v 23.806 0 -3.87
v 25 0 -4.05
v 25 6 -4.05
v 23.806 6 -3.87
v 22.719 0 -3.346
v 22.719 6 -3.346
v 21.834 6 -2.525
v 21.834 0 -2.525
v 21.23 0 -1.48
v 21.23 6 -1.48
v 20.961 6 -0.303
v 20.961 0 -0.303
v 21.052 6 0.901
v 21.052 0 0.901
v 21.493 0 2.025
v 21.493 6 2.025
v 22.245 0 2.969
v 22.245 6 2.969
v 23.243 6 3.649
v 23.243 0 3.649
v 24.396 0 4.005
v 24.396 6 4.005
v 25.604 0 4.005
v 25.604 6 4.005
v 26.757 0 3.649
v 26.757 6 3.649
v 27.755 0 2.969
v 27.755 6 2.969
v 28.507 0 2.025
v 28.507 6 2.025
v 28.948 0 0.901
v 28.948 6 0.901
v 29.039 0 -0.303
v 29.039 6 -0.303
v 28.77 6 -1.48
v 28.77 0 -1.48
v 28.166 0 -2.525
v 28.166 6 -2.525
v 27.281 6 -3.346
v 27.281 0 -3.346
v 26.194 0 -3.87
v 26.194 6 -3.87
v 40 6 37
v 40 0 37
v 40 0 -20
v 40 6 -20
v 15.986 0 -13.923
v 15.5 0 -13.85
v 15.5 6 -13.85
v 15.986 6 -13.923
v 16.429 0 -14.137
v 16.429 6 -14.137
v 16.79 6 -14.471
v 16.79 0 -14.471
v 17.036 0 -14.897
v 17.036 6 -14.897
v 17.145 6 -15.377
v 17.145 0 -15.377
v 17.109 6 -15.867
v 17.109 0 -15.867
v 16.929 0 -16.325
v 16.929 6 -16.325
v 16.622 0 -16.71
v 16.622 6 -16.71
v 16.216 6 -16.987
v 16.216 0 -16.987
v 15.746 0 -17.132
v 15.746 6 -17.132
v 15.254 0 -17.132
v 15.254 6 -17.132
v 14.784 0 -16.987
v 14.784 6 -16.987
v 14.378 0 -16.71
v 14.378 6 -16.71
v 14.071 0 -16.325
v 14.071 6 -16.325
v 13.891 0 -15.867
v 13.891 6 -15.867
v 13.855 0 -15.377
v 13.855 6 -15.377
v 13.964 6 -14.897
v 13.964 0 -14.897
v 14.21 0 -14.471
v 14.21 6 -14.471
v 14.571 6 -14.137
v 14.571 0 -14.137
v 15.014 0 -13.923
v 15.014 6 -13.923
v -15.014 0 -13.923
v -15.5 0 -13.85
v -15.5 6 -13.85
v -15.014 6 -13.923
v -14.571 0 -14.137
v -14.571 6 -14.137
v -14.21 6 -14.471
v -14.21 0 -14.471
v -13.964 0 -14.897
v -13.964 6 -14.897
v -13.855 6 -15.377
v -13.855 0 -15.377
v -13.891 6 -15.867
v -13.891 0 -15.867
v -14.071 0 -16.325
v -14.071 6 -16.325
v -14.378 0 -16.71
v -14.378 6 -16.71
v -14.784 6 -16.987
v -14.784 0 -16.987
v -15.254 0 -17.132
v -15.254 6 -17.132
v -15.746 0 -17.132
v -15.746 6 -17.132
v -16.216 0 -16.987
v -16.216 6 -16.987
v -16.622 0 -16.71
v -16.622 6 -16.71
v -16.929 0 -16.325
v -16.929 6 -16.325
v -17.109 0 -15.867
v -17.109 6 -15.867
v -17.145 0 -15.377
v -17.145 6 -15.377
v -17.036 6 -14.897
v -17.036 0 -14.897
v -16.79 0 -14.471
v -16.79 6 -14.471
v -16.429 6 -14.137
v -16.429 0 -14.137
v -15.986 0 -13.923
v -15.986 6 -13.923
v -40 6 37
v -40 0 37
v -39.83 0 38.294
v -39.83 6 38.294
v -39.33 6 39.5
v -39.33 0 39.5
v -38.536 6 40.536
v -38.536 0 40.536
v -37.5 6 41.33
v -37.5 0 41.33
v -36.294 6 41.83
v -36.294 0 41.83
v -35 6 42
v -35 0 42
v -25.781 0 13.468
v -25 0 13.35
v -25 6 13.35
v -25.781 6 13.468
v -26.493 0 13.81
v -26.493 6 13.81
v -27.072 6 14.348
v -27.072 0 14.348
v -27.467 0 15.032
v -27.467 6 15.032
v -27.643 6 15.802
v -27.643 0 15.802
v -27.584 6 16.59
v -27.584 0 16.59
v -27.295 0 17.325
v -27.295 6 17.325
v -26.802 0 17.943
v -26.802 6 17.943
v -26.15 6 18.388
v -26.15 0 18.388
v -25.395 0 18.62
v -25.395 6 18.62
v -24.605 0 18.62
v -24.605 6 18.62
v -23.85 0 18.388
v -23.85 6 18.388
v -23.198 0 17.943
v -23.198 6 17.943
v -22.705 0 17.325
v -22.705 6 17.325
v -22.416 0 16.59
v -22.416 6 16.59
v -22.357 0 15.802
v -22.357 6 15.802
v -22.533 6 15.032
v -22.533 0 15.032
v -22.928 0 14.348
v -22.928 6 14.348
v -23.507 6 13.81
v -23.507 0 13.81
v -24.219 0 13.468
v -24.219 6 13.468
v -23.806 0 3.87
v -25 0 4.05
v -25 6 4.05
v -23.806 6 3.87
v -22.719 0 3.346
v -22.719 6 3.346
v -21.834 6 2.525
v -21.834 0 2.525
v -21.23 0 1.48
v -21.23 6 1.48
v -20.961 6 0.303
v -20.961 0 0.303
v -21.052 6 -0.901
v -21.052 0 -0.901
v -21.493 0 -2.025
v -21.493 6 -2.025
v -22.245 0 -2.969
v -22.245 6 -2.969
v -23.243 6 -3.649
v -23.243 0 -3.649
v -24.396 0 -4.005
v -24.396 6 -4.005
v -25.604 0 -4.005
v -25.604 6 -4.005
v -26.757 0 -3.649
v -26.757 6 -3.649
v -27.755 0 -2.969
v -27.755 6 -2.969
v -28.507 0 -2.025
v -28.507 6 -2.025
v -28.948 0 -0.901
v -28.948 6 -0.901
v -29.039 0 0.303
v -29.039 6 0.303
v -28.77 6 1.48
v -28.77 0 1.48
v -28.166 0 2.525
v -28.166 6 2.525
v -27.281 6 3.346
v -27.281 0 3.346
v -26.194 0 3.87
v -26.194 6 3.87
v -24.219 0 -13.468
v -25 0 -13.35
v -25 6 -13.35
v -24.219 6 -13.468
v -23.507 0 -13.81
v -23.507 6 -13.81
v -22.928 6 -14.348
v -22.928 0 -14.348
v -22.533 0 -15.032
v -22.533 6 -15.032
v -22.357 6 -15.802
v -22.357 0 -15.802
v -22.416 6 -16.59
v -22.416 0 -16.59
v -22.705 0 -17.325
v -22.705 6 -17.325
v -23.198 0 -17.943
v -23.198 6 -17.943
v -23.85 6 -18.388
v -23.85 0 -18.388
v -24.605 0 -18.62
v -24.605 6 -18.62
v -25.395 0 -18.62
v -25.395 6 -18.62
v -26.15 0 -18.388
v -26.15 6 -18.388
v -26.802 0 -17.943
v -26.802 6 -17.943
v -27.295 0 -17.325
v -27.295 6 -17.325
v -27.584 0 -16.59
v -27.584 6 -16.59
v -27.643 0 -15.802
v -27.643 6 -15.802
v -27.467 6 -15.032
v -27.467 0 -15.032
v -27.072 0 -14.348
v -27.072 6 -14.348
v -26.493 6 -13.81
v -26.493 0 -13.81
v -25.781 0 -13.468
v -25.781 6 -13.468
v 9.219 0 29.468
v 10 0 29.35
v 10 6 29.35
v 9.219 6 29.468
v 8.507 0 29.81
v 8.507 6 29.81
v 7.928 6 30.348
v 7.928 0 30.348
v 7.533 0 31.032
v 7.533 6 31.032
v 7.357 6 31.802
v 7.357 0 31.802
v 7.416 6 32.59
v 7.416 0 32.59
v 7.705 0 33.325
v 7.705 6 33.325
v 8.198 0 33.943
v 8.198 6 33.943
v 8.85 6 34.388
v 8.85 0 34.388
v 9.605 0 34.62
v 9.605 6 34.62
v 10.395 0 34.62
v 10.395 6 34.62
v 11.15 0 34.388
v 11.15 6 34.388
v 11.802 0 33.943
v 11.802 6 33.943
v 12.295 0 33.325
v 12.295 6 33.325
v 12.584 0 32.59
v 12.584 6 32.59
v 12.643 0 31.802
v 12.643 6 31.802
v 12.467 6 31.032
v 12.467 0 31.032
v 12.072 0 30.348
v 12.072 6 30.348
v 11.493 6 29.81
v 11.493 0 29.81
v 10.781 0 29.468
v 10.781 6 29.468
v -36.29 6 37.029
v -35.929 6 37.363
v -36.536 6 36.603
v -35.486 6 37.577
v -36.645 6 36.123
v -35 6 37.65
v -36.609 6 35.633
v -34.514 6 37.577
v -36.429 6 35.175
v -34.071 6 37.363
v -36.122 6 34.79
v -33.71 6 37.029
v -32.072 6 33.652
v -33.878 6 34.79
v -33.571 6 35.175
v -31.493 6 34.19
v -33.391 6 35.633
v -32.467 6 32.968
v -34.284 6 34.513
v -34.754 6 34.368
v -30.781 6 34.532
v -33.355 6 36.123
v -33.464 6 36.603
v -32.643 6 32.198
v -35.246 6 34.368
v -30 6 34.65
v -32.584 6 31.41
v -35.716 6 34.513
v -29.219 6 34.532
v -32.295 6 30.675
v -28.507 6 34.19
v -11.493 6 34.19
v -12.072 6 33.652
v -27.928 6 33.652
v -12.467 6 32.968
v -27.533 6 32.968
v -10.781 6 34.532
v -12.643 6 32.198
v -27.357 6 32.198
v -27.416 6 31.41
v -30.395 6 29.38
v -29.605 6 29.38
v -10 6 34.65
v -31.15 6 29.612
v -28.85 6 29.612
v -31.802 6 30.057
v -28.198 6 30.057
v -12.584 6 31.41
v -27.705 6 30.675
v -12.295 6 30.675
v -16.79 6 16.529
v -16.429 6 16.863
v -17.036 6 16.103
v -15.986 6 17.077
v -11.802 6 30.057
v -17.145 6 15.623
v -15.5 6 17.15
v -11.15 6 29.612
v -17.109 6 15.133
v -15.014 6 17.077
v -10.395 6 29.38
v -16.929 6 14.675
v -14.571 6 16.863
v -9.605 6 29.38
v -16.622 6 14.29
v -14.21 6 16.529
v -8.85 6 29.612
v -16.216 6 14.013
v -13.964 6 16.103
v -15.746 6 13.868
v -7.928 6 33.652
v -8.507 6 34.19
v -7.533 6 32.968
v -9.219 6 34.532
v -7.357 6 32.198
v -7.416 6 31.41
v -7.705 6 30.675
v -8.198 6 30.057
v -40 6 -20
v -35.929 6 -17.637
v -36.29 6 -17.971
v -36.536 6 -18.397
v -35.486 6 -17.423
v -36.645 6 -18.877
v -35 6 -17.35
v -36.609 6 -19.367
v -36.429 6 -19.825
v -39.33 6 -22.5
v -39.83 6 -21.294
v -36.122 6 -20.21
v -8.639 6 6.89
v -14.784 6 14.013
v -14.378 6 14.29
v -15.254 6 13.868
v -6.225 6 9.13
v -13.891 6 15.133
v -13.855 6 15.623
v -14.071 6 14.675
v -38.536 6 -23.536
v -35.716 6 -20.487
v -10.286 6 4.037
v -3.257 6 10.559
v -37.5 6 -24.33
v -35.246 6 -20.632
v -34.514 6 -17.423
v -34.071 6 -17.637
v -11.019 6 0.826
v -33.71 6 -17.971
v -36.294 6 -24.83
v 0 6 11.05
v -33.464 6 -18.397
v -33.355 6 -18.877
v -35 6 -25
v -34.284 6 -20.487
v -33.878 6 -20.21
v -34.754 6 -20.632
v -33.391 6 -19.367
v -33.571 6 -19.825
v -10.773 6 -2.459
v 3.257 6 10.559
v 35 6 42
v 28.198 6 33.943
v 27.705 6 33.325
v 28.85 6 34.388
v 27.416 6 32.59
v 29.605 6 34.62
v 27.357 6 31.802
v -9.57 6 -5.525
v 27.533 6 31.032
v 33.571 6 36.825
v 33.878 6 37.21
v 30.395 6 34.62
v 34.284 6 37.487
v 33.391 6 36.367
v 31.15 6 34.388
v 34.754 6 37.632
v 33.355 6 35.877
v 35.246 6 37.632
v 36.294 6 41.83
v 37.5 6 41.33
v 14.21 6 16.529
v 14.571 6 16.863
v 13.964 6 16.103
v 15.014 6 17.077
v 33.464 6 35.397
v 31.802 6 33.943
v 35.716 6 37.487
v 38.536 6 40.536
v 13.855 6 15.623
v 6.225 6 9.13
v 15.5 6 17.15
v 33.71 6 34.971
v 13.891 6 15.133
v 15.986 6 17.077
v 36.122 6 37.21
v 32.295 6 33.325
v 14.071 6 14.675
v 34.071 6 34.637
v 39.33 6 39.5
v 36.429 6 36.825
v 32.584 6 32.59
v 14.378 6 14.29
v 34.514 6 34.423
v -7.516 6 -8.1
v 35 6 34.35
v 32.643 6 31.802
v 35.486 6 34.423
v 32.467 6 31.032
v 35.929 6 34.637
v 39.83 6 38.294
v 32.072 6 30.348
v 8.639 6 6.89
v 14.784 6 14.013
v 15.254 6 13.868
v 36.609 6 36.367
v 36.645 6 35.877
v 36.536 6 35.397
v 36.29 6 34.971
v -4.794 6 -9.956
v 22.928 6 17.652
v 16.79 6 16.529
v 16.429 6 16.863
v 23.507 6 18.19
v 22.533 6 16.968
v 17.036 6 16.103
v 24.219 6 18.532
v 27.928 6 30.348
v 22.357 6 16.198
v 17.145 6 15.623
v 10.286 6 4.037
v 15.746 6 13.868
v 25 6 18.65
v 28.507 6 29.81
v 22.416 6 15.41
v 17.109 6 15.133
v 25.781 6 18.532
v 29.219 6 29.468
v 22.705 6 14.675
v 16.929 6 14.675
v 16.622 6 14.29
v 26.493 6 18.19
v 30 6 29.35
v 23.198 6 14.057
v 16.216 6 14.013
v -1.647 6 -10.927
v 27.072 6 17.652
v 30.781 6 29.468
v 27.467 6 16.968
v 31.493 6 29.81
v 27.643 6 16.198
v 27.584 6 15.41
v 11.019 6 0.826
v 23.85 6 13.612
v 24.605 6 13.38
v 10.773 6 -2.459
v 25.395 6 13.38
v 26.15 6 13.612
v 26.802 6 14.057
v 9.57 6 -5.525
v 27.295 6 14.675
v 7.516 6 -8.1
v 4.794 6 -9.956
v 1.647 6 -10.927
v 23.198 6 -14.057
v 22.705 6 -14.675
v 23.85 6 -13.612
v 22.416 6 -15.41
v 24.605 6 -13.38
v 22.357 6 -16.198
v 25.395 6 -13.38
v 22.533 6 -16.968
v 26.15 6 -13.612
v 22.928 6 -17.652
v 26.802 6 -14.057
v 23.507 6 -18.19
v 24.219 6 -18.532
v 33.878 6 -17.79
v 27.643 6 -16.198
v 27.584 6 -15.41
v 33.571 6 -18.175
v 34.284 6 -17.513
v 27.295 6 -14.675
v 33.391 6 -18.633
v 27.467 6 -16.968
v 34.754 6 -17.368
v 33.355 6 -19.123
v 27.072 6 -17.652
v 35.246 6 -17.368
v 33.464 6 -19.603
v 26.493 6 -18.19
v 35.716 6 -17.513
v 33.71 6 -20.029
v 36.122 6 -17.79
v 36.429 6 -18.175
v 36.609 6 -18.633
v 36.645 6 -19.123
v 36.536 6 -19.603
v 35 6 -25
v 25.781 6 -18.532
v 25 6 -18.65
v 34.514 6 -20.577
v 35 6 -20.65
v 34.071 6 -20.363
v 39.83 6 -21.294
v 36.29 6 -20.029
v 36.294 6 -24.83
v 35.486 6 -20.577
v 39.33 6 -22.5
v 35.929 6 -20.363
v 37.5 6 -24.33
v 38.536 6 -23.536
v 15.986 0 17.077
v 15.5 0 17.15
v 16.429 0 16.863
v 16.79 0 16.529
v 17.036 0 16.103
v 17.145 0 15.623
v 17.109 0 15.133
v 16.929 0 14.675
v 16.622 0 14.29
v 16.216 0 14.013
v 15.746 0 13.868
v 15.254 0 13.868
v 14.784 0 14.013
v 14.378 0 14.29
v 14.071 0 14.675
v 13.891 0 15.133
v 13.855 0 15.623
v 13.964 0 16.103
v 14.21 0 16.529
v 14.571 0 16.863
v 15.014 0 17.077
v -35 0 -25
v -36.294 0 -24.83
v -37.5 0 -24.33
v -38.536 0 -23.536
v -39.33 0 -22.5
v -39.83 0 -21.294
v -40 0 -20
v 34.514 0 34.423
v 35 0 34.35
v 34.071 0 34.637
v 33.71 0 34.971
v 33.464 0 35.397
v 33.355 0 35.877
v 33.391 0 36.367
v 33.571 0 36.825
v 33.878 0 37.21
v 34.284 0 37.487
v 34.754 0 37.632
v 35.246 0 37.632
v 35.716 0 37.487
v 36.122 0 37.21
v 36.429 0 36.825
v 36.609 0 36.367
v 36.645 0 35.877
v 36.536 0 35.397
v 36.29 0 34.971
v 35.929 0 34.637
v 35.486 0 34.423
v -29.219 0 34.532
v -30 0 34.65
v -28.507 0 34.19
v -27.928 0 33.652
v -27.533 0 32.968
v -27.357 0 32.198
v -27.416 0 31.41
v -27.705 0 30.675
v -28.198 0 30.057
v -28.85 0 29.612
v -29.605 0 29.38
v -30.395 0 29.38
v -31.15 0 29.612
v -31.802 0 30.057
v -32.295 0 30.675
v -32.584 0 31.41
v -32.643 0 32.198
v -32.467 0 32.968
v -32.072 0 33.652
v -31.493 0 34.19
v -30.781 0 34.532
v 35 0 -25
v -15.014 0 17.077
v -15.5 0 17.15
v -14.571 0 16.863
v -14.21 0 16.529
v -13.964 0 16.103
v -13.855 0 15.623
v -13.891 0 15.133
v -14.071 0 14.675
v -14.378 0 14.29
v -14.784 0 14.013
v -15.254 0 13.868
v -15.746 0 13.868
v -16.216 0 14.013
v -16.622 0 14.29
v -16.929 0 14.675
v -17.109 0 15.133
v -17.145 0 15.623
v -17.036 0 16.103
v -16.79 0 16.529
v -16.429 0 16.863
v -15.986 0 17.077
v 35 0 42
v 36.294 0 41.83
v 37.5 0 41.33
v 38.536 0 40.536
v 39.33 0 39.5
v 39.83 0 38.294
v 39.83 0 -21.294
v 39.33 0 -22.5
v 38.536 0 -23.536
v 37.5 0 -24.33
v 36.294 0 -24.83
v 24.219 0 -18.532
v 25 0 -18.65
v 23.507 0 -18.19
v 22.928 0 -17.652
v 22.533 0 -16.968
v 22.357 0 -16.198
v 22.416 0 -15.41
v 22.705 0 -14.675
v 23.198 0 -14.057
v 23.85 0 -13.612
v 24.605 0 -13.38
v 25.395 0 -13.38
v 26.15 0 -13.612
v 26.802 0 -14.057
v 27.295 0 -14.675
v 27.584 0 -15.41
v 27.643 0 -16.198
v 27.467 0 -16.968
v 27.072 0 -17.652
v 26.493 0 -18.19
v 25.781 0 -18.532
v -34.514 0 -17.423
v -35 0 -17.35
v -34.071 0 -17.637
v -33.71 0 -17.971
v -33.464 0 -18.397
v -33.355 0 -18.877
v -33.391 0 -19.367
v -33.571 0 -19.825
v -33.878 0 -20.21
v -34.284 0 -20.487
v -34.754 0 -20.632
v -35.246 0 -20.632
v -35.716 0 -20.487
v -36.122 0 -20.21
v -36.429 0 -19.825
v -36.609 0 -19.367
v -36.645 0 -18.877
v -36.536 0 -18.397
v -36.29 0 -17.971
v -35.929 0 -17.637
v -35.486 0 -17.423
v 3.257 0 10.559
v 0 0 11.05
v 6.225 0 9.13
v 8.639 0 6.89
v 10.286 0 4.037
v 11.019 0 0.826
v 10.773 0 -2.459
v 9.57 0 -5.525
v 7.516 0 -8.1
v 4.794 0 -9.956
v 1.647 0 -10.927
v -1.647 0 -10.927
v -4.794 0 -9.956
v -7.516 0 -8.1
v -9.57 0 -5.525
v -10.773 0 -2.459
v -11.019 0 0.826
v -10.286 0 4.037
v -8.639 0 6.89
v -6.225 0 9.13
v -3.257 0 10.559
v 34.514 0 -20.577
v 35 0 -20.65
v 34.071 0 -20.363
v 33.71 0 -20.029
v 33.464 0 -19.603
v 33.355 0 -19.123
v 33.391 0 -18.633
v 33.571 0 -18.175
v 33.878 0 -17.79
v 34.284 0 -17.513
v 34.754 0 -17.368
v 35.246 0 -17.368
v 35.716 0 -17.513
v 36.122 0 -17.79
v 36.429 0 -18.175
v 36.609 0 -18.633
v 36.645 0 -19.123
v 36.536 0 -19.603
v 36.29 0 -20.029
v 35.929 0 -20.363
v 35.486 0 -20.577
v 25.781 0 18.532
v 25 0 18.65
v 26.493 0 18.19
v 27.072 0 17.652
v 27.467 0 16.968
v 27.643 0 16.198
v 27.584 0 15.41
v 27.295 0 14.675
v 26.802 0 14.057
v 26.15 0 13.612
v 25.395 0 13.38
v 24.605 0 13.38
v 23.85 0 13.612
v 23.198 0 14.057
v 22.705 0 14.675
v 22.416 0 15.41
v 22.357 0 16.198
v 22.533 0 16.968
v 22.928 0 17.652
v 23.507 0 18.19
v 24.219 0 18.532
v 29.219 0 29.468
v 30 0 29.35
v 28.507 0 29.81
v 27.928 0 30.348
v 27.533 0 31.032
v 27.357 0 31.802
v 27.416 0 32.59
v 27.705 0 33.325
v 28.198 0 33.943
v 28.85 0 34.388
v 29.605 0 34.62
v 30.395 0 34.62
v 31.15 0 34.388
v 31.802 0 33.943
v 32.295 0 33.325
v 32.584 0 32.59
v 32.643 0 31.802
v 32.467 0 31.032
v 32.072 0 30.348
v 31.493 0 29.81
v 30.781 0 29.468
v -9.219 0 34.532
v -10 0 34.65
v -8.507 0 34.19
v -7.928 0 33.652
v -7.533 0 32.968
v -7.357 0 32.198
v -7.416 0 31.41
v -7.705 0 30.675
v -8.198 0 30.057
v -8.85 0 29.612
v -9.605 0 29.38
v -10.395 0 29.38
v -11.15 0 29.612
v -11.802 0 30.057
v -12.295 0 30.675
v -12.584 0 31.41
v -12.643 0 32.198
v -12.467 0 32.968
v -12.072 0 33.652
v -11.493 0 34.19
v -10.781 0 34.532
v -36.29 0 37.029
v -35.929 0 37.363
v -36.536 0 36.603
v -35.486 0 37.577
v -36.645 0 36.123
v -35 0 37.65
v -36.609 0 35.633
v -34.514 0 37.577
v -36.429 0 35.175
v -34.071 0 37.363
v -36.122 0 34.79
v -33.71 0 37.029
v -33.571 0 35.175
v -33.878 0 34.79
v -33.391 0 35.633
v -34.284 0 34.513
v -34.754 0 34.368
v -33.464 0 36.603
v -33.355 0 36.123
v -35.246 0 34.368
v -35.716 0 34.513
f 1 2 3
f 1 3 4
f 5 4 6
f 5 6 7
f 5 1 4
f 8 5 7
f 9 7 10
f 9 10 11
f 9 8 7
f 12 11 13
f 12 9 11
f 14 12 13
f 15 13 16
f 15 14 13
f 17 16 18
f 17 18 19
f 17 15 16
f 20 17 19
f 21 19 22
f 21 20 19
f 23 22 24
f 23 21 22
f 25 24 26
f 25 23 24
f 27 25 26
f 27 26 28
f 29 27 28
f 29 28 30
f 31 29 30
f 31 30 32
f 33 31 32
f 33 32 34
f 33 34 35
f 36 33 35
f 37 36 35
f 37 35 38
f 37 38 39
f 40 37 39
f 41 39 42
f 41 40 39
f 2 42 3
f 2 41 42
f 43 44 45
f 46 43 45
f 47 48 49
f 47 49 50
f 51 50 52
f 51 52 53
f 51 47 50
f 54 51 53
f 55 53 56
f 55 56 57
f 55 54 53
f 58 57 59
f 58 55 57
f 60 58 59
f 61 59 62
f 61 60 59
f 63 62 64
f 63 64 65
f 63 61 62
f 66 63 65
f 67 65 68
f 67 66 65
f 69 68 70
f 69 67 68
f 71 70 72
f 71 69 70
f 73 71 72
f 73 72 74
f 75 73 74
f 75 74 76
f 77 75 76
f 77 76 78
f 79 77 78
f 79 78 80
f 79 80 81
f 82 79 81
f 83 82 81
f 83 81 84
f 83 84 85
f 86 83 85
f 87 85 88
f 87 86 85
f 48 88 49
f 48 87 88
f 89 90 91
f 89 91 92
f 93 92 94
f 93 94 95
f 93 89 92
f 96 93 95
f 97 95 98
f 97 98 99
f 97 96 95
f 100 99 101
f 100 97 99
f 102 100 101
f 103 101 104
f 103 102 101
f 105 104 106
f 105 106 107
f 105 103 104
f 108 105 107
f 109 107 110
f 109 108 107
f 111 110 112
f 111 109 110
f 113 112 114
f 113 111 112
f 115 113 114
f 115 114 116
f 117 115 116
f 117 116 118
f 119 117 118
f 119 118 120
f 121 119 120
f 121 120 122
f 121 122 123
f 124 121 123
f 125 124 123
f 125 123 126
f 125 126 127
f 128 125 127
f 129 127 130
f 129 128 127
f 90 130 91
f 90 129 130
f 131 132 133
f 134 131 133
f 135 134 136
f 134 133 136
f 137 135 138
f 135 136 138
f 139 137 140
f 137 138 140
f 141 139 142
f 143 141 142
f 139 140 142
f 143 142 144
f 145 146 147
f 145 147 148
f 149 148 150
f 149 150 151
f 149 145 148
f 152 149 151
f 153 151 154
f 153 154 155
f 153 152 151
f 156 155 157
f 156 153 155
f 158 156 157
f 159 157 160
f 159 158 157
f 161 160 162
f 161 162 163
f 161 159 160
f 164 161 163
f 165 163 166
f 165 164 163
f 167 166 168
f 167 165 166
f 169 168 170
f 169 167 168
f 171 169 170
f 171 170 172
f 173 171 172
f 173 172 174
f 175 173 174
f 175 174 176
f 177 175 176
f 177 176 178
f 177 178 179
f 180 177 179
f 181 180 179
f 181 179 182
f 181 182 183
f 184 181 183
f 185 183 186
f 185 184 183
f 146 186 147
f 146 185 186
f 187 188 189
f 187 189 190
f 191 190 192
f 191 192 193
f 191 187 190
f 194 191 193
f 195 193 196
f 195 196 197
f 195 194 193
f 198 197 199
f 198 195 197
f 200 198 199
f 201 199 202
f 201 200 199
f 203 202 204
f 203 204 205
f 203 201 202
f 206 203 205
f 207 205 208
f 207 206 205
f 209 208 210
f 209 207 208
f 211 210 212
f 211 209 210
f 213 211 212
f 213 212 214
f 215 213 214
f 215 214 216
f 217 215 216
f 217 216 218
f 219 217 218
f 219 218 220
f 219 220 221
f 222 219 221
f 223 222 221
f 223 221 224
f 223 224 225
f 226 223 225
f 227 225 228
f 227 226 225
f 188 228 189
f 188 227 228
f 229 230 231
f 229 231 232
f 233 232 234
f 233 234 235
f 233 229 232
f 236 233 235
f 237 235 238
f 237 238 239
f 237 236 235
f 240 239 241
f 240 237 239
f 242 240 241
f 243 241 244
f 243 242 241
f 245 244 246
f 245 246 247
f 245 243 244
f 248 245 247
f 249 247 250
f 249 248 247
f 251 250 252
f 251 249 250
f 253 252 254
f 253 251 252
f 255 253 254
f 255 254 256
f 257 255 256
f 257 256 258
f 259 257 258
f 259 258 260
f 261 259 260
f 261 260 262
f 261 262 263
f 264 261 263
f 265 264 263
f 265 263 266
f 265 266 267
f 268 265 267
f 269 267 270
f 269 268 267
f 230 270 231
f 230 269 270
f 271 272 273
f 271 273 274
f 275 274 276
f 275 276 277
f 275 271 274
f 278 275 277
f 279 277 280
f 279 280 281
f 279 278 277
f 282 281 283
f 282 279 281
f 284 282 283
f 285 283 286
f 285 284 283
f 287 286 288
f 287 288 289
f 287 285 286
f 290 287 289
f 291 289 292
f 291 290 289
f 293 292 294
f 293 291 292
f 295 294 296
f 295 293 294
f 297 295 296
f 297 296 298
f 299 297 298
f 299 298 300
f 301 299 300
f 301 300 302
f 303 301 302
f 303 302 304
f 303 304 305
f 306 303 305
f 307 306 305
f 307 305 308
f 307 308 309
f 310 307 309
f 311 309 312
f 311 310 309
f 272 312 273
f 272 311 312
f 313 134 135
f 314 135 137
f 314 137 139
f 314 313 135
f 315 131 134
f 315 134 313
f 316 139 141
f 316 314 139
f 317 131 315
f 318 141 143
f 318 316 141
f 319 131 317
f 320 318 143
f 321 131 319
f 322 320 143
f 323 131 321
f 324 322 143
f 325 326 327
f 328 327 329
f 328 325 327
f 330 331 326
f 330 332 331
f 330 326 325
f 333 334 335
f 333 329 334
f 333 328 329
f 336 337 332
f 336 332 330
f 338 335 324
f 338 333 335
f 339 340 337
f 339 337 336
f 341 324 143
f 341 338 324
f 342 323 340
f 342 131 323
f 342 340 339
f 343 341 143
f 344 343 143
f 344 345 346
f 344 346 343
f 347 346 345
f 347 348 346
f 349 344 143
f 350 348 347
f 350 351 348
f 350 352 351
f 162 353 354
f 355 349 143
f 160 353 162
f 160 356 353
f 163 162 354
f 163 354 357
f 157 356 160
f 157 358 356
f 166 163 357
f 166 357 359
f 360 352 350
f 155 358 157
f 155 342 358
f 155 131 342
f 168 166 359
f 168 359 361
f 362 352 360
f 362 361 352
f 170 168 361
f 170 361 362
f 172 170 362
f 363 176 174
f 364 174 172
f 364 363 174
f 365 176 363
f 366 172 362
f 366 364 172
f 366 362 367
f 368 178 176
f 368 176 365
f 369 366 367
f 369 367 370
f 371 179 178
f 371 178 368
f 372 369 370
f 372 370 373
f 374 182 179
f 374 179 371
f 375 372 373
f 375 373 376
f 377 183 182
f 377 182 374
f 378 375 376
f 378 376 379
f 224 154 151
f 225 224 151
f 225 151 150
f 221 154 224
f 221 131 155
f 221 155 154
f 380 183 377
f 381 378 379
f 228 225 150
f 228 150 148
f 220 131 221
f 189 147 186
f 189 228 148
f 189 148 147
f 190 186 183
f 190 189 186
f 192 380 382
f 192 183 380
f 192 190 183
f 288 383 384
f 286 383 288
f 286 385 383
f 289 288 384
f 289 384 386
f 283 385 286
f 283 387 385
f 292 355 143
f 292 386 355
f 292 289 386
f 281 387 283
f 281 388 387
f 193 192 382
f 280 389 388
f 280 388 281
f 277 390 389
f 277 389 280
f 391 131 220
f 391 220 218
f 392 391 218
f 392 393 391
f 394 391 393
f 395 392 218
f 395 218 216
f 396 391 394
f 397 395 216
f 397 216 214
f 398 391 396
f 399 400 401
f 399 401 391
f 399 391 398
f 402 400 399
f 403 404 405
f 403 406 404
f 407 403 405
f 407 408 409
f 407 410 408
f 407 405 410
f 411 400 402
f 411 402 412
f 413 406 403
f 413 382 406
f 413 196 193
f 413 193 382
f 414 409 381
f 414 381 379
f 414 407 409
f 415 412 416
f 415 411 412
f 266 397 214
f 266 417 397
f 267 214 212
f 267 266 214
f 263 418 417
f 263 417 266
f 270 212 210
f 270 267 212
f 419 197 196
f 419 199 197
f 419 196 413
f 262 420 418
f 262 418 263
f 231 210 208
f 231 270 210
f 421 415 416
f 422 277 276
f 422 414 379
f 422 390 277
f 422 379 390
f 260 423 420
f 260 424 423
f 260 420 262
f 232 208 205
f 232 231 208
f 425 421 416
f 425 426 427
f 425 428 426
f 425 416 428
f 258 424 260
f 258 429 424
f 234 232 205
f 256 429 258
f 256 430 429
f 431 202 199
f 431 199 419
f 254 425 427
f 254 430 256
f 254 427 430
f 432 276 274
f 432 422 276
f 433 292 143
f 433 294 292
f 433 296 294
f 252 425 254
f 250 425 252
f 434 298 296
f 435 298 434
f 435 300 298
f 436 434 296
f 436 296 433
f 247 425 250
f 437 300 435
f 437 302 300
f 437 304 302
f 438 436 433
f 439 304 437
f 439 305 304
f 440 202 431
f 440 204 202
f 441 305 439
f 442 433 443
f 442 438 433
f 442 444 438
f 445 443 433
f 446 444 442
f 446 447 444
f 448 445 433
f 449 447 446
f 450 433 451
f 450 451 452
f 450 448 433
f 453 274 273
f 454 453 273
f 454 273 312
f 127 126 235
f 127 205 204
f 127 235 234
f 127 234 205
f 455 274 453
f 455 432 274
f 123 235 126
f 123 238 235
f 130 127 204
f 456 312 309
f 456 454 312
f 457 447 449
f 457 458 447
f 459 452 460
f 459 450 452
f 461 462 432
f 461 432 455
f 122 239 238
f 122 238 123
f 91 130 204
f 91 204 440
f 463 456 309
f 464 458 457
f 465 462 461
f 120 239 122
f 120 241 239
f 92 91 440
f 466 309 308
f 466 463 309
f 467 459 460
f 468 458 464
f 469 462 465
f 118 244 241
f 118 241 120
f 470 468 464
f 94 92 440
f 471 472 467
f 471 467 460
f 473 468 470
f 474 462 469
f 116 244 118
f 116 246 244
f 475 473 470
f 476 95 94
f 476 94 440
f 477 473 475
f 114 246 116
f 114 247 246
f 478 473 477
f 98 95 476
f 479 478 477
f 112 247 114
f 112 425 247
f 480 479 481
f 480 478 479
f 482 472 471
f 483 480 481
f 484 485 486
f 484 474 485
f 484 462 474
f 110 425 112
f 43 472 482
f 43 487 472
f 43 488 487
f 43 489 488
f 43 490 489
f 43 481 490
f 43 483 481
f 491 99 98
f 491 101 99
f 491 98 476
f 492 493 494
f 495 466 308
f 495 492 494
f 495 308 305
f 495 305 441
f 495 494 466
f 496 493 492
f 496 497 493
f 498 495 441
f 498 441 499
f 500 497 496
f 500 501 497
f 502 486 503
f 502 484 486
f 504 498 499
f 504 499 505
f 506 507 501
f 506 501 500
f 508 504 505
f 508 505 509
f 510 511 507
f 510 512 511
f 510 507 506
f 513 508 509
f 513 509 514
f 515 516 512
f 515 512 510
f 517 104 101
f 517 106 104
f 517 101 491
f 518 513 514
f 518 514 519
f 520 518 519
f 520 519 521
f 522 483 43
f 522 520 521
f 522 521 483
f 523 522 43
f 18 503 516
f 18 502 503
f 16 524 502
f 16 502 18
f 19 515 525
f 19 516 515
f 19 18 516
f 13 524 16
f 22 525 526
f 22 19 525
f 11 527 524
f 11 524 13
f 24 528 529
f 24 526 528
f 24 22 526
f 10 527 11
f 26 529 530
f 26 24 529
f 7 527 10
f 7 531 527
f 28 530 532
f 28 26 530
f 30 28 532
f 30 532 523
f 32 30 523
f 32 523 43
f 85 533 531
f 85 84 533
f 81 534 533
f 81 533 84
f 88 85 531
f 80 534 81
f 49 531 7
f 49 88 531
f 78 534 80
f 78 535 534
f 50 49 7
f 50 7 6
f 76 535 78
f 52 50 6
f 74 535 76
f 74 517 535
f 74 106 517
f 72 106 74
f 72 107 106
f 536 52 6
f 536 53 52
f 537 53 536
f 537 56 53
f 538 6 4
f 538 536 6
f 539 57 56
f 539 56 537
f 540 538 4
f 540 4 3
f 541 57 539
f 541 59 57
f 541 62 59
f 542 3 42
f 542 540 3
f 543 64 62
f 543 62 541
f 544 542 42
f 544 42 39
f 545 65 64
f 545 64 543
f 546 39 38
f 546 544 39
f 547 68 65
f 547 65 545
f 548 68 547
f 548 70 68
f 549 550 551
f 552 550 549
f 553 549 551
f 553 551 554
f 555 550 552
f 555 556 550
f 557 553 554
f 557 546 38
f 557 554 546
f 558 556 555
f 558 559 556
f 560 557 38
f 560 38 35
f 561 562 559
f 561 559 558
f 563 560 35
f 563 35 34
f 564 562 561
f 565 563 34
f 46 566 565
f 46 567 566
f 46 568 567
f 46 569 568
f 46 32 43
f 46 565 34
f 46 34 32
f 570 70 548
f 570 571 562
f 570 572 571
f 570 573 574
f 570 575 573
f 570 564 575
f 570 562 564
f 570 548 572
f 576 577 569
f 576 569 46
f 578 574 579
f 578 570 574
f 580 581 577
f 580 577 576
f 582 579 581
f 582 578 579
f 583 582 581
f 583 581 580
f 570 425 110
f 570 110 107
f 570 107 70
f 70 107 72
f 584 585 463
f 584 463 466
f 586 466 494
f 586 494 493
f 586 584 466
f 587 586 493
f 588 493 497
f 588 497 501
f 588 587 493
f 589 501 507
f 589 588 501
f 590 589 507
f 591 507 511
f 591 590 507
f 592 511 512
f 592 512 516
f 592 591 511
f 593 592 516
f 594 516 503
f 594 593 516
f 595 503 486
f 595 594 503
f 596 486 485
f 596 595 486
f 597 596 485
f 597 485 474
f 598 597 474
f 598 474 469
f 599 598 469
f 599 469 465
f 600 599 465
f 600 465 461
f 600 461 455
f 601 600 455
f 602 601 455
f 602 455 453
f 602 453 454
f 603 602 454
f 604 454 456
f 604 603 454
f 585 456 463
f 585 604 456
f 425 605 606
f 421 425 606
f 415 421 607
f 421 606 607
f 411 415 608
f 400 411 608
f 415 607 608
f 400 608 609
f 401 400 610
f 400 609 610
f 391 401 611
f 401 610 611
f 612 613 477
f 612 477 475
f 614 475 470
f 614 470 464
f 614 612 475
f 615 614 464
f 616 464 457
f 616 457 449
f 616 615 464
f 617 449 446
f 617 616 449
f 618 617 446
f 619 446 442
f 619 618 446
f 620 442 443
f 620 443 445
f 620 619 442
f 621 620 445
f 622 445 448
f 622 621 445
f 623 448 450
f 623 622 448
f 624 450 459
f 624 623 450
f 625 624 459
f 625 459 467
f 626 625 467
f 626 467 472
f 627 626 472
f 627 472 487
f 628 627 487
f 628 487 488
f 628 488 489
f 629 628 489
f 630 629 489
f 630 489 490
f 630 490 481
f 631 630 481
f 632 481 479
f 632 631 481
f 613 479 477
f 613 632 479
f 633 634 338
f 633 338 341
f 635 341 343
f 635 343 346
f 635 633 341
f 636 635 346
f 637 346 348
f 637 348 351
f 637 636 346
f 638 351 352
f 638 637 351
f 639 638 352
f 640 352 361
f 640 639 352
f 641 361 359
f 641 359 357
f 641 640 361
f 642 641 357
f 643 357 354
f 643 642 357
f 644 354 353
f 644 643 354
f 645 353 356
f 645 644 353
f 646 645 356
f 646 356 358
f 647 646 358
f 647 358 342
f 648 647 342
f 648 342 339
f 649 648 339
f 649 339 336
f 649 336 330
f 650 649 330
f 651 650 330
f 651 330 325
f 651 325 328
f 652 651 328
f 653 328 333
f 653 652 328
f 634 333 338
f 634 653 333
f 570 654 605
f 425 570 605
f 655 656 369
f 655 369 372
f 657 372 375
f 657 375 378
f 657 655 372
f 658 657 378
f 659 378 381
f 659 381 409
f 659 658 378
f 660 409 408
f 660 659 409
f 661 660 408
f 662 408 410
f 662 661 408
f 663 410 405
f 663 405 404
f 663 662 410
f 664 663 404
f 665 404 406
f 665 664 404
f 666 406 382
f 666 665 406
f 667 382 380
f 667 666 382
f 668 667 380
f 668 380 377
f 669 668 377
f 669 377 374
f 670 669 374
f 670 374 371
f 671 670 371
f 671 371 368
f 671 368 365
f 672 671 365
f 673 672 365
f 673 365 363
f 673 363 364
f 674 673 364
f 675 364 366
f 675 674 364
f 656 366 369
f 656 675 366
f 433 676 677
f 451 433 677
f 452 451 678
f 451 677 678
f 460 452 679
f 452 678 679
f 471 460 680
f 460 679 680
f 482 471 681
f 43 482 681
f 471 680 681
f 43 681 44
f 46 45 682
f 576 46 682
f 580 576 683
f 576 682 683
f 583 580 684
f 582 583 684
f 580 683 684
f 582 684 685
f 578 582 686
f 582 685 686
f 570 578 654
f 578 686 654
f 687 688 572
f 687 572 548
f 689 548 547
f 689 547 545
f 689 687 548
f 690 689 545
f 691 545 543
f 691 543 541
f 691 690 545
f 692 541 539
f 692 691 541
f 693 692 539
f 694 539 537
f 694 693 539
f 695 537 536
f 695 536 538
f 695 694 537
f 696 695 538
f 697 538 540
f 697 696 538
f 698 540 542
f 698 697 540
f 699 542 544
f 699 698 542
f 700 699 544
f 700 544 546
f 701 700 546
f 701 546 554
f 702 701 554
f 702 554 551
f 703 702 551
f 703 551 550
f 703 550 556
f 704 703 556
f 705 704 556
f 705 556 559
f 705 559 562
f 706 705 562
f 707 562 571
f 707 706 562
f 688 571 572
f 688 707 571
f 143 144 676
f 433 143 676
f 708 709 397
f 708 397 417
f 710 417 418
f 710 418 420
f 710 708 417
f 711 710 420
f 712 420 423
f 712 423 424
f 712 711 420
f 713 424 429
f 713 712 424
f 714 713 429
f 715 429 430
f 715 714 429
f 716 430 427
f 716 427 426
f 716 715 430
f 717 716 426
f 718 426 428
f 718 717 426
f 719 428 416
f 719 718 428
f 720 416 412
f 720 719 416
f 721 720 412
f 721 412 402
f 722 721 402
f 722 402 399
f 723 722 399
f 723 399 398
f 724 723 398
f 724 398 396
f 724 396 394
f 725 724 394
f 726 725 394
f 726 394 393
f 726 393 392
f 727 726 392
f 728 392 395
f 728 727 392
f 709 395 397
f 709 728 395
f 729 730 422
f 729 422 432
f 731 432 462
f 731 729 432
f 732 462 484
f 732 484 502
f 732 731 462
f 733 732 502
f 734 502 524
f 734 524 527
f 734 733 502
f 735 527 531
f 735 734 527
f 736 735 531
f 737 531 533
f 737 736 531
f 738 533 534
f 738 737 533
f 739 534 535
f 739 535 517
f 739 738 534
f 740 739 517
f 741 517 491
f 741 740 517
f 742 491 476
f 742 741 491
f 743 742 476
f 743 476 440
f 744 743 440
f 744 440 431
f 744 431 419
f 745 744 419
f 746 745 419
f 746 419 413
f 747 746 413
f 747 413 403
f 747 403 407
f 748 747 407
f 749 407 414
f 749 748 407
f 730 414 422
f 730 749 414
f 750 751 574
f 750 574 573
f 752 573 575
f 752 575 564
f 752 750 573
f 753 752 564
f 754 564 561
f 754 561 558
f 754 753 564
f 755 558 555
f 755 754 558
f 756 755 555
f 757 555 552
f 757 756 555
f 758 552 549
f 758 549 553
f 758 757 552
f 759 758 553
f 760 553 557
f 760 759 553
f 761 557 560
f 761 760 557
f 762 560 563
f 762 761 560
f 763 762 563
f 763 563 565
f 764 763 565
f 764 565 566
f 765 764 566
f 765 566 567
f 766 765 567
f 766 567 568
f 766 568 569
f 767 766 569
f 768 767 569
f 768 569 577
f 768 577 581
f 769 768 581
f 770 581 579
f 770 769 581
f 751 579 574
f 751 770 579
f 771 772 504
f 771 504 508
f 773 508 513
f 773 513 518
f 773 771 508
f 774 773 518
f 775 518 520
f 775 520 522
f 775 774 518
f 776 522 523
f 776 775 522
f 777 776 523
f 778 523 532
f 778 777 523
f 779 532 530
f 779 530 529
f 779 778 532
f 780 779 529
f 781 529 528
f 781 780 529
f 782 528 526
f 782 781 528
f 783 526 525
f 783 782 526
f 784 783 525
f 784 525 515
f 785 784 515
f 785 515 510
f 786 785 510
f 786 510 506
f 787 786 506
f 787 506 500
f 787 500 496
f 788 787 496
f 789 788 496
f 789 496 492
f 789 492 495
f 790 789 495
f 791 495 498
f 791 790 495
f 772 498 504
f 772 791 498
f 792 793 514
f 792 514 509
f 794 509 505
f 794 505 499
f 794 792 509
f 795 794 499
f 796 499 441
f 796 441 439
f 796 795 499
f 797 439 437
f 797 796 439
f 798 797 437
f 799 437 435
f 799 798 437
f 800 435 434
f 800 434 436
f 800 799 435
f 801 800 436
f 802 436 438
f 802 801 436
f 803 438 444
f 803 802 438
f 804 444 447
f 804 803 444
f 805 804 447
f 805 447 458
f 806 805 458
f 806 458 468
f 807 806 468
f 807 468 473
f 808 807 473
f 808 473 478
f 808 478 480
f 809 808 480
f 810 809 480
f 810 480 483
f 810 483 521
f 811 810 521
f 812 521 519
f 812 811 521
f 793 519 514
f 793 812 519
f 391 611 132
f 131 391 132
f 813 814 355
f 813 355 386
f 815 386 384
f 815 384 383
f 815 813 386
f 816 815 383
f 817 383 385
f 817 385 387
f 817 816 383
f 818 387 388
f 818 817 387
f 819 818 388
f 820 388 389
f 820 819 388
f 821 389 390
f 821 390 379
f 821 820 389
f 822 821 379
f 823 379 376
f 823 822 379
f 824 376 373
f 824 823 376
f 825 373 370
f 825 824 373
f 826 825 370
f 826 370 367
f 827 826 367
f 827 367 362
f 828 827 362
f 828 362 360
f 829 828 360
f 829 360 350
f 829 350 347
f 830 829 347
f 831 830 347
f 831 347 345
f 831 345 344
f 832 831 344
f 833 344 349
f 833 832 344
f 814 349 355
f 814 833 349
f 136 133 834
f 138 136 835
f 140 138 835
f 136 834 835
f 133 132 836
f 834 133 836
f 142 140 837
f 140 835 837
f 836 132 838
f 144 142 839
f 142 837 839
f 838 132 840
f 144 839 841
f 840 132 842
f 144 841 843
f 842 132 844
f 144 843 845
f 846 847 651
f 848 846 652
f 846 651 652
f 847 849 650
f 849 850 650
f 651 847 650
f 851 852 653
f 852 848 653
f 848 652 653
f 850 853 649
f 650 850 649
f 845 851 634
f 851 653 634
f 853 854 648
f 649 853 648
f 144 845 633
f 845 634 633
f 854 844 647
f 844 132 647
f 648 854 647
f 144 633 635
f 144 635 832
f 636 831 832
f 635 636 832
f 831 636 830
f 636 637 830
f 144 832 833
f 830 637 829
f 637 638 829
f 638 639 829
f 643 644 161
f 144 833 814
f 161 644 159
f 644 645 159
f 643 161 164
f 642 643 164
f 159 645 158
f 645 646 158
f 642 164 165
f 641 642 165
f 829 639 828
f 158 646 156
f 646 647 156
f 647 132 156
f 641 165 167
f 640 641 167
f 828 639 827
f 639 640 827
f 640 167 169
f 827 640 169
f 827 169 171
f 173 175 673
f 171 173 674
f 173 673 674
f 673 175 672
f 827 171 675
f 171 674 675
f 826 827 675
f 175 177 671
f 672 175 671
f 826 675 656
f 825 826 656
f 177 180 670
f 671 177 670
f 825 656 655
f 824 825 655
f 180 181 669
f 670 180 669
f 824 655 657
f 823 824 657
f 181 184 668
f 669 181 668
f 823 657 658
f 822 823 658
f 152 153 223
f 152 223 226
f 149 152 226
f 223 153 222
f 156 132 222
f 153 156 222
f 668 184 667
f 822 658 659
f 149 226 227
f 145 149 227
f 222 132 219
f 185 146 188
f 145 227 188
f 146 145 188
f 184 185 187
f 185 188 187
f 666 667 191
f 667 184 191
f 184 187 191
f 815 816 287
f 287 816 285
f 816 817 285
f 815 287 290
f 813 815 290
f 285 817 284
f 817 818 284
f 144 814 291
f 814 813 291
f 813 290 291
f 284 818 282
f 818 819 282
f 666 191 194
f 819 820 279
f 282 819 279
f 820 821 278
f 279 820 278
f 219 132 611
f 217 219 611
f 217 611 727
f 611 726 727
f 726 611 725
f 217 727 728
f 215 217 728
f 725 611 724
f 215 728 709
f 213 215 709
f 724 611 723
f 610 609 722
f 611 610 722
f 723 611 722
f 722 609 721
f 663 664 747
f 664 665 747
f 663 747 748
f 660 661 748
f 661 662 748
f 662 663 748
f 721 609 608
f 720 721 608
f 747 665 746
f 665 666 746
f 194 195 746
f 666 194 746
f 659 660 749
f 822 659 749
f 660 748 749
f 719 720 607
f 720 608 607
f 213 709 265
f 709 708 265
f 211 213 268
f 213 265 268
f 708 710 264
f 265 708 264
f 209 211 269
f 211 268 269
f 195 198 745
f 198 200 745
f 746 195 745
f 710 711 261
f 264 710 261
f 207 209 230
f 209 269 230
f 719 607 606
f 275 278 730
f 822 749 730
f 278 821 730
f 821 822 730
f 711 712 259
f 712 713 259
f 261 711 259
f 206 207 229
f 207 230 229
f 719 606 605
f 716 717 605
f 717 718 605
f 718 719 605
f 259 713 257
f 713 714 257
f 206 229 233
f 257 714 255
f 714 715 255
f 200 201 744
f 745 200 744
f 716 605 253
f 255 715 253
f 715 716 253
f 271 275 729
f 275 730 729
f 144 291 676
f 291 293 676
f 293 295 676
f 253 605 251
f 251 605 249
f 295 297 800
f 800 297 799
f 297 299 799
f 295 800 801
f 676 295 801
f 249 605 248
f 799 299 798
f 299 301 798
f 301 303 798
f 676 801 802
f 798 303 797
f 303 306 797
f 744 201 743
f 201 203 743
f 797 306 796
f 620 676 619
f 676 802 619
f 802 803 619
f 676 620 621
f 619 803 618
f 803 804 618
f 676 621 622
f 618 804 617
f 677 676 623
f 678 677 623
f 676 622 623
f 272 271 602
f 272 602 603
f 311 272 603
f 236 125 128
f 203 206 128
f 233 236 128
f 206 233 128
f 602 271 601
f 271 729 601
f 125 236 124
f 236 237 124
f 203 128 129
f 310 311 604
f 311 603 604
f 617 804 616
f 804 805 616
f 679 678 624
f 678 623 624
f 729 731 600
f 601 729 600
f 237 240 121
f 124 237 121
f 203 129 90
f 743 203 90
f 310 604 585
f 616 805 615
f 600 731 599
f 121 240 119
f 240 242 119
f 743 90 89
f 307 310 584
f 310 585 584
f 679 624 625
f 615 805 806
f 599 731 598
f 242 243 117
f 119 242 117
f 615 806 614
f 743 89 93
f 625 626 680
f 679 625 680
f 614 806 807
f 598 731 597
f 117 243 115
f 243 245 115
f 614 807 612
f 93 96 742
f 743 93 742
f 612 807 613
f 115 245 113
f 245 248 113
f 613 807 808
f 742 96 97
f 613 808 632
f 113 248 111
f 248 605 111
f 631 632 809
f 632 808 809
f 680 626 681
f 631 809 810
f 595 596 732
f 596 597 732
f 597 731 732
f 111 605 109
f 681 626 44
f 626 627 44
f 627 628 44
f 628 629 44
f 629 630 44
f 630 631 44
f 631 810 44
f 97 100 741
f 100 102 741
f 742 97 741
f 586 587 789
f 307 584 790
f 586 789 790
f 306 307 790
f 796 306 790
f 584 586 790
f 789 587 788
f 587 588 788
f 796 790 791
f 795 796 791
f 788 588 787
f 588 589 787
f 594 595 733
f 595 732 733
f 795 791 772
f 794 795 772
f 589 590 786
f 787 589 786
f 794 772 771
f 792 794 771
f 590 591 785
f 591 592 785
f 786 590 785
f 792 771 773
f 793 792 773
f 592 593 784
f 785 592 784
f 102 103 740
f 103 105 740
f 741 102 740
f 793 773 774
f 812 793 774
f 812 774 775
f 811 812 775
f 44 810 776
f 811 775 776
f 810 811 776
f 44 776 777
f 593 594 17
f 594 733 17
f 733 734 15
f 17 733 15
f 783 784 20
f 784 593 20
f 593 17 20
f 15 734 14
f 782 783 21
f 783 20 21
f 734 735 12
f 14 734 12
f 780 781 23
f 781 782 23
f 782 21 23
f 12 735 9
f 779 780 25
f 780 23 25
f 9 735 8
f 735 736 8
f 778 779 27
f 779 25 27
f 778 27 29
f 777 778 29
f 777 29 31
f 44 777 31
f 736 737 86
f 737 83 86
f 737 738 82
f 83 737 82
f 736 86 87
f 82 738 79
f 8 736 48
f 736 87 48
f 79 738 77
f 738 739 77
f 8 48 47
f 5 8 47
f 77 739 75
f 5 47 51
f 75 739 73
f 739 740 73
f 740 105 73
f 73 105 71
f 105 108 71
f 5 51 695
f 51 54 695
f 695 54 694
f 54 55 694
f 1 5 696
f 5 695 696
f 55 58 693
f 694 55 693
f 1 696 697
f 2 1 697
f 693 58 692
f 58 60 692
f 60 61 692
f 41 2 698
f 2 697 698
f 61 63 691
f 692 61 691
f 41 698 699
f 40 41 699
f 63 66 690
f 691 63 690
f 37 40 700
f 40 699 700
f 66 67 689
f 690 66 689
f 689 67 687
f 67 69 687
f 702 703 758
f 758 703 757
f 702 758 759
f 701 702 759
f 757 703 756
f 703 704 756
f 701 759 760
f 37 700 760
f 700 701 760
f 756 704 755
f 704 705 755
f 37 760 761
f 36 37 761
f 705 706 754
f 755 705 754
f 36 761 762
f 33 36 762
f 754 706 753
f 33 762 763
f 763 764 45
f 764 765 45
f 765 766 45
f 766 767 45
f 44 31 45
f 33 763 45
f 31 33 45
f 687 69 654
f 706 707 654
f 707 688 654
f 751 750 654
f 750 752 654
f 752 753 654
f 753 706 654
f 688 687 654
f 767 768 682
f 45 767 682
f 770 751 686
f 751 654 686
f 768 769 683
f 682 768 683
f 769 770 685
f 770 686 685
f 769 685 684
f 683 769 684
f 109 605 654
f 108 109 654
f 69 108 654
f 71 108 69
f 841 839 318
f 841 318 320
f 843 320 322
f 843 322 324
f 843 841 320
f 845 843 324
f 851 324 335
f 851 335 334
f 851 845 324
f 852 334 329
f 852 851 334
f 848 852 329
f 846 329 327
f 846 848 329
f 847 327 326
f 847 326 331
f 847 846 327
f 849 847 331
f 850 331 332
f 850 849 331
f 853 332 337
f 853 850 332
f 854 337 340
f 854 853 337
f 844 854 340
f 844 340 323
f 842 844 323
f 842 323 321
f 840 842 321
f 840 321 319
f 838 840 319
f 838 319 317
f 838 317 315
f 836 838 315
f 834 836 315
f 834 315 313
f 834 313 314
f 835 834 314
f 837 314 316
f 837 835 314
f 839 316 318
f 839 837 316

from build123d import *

# Parameters (mm, degrees)
SKETCH_1_R      = 11.05
SKETCH_1_R_2    = 1.65
SKETCH_1_R_3    = 4.05
SKETCH_1_R_4    = 2.65
EXTRUDE_1_DEPTH = 6


with BuildPart() as part:
    # 草图1 → 凸台-拉伸1 (new body)
    with BuildSketch(Plane(origin=(0, 0, 0), x_dir=(1, 0, 0), z_dir=(0, 1, 0))):
        with BuildLine():
            Line((-35, -42), (35, -42))
            ThreePointArc((35, -42), (38.535533906, -40.535533906), (40, -37))
            Line((40, -37), (40, 20))
            ThreePointArc((40, 20), (38.535533906, 23.535533906), (35, 25))
            Line((35, 25), (-35, 25))
            ThreePointArc((-35, 25), (-38.535533906, 23.535533906), (-40, 20))
            Line((-40, 20), (-40, -37))
            ThreePointArc((-40, -37), (-38.535533906, -40.535533906), (-35, -42))
        make_face()
        with Locations(Location((0, 0, 0), (0, 0, 270))):
            Circle(SKETCH_1_R, mode=Mode.SUBTRACT)
        with Locations(Location((-15.5, 15.5, 0), (0, 0, 270))):
            Circle(SKETCH_1_R_2, mode=Mode.SUBTRACT)
        with Locations(Location((15.5, 15.5, 0), (0, 0, 270))):
            Circle(SKETCH_1_R_2, mode=Mode.SUBTRACT)
        with Locations(Location((15.5, -15.5, 0), (0, 0, 270))):
            Circle(SKETCH_1_R_2, mode=Mode.SUBTRACT)
        with Locations(Location((-15.5, -15.5, 0), (0, 0, 270))):
            Circle(SKETCH_1_R_2, mode=Mode.SUBTRACT)
        with Locations(Location((-25, 0, 0), (0, 0, 270))):
            Circle(SKETCH_1_R_3, mode=Mode.SUBTRACT)
        with Locations(Location((-25, 16, 0), (0, 0, 270))):
            Circle(SKETCH_1_R_4, mode=Mode.SUBTRACT)
        with Locations(Location((-25, -16, 0), (0, 0, 90))):
            Circle(SKETCH_1_R_4, mode=Mode.SUBTRACT)
        with Locations(Location((25, 0, 0), (0, 0, 90))):
            Circle(SKETCH_1_R_3, mode=Mode.SUBTRACT)
        with Locations(Location((25, -16, 0), (0, 0, 270))):
            Circle(SKETCH_1_R_4, mode=Mode.SUBTRACT)
        with Locations(Location((25, 16, 0), (0, 0, 90))):
            Circle(SKETCH_1_R_4, mode=Mode.SUBTRACT)
        with Locations(Location((-35, 19, 0), (0, 0, 270))):
            Circle(SKETCH_1_R_2, mode=Mode.SUBTRACT)
        with Locations(Location((-35, -36, 0), (0, 0, 270))):
            Circle(SKETCH_1_R_2, mode=Mode.SUBTRACT)
        with Locations(Location((35, -36, 0), (0, 0, 90))):
            Circle(SKETCH_1_R_2, mode=Mode.SUBTRACT)
        with Locations(Location((35, 19, 0), (0, 0, 90))):
            Circle(SKETCH_1_R_2, mode=Mode.SUBTRACT)
        with Locations(Location((-10, -32, 0), (0, 0, 270))):
            Circle(SKETCH_1_R_4, mode=Mode.SUBTRACT)
        with Locations(Location((-30, -32, 0), (0, 0, 270))):
            Circle(SKETCH_1_R_4, mode=Mode.SUBTRACT)
        with Locations(Location((30, -32, 0), (0, 0, 90))):
            Circle(SKETCH_1_R_4, mode=Mode.SUBTRACT)
        with Locations(Location((10, -32, 0), (0, 0, 90))):
            Circle(SKETCH_1_R_4, mode=Mode.SUBTRACT)
    extrude(amount=EXTRUDE_1_DEPTH)


solid = part.part
